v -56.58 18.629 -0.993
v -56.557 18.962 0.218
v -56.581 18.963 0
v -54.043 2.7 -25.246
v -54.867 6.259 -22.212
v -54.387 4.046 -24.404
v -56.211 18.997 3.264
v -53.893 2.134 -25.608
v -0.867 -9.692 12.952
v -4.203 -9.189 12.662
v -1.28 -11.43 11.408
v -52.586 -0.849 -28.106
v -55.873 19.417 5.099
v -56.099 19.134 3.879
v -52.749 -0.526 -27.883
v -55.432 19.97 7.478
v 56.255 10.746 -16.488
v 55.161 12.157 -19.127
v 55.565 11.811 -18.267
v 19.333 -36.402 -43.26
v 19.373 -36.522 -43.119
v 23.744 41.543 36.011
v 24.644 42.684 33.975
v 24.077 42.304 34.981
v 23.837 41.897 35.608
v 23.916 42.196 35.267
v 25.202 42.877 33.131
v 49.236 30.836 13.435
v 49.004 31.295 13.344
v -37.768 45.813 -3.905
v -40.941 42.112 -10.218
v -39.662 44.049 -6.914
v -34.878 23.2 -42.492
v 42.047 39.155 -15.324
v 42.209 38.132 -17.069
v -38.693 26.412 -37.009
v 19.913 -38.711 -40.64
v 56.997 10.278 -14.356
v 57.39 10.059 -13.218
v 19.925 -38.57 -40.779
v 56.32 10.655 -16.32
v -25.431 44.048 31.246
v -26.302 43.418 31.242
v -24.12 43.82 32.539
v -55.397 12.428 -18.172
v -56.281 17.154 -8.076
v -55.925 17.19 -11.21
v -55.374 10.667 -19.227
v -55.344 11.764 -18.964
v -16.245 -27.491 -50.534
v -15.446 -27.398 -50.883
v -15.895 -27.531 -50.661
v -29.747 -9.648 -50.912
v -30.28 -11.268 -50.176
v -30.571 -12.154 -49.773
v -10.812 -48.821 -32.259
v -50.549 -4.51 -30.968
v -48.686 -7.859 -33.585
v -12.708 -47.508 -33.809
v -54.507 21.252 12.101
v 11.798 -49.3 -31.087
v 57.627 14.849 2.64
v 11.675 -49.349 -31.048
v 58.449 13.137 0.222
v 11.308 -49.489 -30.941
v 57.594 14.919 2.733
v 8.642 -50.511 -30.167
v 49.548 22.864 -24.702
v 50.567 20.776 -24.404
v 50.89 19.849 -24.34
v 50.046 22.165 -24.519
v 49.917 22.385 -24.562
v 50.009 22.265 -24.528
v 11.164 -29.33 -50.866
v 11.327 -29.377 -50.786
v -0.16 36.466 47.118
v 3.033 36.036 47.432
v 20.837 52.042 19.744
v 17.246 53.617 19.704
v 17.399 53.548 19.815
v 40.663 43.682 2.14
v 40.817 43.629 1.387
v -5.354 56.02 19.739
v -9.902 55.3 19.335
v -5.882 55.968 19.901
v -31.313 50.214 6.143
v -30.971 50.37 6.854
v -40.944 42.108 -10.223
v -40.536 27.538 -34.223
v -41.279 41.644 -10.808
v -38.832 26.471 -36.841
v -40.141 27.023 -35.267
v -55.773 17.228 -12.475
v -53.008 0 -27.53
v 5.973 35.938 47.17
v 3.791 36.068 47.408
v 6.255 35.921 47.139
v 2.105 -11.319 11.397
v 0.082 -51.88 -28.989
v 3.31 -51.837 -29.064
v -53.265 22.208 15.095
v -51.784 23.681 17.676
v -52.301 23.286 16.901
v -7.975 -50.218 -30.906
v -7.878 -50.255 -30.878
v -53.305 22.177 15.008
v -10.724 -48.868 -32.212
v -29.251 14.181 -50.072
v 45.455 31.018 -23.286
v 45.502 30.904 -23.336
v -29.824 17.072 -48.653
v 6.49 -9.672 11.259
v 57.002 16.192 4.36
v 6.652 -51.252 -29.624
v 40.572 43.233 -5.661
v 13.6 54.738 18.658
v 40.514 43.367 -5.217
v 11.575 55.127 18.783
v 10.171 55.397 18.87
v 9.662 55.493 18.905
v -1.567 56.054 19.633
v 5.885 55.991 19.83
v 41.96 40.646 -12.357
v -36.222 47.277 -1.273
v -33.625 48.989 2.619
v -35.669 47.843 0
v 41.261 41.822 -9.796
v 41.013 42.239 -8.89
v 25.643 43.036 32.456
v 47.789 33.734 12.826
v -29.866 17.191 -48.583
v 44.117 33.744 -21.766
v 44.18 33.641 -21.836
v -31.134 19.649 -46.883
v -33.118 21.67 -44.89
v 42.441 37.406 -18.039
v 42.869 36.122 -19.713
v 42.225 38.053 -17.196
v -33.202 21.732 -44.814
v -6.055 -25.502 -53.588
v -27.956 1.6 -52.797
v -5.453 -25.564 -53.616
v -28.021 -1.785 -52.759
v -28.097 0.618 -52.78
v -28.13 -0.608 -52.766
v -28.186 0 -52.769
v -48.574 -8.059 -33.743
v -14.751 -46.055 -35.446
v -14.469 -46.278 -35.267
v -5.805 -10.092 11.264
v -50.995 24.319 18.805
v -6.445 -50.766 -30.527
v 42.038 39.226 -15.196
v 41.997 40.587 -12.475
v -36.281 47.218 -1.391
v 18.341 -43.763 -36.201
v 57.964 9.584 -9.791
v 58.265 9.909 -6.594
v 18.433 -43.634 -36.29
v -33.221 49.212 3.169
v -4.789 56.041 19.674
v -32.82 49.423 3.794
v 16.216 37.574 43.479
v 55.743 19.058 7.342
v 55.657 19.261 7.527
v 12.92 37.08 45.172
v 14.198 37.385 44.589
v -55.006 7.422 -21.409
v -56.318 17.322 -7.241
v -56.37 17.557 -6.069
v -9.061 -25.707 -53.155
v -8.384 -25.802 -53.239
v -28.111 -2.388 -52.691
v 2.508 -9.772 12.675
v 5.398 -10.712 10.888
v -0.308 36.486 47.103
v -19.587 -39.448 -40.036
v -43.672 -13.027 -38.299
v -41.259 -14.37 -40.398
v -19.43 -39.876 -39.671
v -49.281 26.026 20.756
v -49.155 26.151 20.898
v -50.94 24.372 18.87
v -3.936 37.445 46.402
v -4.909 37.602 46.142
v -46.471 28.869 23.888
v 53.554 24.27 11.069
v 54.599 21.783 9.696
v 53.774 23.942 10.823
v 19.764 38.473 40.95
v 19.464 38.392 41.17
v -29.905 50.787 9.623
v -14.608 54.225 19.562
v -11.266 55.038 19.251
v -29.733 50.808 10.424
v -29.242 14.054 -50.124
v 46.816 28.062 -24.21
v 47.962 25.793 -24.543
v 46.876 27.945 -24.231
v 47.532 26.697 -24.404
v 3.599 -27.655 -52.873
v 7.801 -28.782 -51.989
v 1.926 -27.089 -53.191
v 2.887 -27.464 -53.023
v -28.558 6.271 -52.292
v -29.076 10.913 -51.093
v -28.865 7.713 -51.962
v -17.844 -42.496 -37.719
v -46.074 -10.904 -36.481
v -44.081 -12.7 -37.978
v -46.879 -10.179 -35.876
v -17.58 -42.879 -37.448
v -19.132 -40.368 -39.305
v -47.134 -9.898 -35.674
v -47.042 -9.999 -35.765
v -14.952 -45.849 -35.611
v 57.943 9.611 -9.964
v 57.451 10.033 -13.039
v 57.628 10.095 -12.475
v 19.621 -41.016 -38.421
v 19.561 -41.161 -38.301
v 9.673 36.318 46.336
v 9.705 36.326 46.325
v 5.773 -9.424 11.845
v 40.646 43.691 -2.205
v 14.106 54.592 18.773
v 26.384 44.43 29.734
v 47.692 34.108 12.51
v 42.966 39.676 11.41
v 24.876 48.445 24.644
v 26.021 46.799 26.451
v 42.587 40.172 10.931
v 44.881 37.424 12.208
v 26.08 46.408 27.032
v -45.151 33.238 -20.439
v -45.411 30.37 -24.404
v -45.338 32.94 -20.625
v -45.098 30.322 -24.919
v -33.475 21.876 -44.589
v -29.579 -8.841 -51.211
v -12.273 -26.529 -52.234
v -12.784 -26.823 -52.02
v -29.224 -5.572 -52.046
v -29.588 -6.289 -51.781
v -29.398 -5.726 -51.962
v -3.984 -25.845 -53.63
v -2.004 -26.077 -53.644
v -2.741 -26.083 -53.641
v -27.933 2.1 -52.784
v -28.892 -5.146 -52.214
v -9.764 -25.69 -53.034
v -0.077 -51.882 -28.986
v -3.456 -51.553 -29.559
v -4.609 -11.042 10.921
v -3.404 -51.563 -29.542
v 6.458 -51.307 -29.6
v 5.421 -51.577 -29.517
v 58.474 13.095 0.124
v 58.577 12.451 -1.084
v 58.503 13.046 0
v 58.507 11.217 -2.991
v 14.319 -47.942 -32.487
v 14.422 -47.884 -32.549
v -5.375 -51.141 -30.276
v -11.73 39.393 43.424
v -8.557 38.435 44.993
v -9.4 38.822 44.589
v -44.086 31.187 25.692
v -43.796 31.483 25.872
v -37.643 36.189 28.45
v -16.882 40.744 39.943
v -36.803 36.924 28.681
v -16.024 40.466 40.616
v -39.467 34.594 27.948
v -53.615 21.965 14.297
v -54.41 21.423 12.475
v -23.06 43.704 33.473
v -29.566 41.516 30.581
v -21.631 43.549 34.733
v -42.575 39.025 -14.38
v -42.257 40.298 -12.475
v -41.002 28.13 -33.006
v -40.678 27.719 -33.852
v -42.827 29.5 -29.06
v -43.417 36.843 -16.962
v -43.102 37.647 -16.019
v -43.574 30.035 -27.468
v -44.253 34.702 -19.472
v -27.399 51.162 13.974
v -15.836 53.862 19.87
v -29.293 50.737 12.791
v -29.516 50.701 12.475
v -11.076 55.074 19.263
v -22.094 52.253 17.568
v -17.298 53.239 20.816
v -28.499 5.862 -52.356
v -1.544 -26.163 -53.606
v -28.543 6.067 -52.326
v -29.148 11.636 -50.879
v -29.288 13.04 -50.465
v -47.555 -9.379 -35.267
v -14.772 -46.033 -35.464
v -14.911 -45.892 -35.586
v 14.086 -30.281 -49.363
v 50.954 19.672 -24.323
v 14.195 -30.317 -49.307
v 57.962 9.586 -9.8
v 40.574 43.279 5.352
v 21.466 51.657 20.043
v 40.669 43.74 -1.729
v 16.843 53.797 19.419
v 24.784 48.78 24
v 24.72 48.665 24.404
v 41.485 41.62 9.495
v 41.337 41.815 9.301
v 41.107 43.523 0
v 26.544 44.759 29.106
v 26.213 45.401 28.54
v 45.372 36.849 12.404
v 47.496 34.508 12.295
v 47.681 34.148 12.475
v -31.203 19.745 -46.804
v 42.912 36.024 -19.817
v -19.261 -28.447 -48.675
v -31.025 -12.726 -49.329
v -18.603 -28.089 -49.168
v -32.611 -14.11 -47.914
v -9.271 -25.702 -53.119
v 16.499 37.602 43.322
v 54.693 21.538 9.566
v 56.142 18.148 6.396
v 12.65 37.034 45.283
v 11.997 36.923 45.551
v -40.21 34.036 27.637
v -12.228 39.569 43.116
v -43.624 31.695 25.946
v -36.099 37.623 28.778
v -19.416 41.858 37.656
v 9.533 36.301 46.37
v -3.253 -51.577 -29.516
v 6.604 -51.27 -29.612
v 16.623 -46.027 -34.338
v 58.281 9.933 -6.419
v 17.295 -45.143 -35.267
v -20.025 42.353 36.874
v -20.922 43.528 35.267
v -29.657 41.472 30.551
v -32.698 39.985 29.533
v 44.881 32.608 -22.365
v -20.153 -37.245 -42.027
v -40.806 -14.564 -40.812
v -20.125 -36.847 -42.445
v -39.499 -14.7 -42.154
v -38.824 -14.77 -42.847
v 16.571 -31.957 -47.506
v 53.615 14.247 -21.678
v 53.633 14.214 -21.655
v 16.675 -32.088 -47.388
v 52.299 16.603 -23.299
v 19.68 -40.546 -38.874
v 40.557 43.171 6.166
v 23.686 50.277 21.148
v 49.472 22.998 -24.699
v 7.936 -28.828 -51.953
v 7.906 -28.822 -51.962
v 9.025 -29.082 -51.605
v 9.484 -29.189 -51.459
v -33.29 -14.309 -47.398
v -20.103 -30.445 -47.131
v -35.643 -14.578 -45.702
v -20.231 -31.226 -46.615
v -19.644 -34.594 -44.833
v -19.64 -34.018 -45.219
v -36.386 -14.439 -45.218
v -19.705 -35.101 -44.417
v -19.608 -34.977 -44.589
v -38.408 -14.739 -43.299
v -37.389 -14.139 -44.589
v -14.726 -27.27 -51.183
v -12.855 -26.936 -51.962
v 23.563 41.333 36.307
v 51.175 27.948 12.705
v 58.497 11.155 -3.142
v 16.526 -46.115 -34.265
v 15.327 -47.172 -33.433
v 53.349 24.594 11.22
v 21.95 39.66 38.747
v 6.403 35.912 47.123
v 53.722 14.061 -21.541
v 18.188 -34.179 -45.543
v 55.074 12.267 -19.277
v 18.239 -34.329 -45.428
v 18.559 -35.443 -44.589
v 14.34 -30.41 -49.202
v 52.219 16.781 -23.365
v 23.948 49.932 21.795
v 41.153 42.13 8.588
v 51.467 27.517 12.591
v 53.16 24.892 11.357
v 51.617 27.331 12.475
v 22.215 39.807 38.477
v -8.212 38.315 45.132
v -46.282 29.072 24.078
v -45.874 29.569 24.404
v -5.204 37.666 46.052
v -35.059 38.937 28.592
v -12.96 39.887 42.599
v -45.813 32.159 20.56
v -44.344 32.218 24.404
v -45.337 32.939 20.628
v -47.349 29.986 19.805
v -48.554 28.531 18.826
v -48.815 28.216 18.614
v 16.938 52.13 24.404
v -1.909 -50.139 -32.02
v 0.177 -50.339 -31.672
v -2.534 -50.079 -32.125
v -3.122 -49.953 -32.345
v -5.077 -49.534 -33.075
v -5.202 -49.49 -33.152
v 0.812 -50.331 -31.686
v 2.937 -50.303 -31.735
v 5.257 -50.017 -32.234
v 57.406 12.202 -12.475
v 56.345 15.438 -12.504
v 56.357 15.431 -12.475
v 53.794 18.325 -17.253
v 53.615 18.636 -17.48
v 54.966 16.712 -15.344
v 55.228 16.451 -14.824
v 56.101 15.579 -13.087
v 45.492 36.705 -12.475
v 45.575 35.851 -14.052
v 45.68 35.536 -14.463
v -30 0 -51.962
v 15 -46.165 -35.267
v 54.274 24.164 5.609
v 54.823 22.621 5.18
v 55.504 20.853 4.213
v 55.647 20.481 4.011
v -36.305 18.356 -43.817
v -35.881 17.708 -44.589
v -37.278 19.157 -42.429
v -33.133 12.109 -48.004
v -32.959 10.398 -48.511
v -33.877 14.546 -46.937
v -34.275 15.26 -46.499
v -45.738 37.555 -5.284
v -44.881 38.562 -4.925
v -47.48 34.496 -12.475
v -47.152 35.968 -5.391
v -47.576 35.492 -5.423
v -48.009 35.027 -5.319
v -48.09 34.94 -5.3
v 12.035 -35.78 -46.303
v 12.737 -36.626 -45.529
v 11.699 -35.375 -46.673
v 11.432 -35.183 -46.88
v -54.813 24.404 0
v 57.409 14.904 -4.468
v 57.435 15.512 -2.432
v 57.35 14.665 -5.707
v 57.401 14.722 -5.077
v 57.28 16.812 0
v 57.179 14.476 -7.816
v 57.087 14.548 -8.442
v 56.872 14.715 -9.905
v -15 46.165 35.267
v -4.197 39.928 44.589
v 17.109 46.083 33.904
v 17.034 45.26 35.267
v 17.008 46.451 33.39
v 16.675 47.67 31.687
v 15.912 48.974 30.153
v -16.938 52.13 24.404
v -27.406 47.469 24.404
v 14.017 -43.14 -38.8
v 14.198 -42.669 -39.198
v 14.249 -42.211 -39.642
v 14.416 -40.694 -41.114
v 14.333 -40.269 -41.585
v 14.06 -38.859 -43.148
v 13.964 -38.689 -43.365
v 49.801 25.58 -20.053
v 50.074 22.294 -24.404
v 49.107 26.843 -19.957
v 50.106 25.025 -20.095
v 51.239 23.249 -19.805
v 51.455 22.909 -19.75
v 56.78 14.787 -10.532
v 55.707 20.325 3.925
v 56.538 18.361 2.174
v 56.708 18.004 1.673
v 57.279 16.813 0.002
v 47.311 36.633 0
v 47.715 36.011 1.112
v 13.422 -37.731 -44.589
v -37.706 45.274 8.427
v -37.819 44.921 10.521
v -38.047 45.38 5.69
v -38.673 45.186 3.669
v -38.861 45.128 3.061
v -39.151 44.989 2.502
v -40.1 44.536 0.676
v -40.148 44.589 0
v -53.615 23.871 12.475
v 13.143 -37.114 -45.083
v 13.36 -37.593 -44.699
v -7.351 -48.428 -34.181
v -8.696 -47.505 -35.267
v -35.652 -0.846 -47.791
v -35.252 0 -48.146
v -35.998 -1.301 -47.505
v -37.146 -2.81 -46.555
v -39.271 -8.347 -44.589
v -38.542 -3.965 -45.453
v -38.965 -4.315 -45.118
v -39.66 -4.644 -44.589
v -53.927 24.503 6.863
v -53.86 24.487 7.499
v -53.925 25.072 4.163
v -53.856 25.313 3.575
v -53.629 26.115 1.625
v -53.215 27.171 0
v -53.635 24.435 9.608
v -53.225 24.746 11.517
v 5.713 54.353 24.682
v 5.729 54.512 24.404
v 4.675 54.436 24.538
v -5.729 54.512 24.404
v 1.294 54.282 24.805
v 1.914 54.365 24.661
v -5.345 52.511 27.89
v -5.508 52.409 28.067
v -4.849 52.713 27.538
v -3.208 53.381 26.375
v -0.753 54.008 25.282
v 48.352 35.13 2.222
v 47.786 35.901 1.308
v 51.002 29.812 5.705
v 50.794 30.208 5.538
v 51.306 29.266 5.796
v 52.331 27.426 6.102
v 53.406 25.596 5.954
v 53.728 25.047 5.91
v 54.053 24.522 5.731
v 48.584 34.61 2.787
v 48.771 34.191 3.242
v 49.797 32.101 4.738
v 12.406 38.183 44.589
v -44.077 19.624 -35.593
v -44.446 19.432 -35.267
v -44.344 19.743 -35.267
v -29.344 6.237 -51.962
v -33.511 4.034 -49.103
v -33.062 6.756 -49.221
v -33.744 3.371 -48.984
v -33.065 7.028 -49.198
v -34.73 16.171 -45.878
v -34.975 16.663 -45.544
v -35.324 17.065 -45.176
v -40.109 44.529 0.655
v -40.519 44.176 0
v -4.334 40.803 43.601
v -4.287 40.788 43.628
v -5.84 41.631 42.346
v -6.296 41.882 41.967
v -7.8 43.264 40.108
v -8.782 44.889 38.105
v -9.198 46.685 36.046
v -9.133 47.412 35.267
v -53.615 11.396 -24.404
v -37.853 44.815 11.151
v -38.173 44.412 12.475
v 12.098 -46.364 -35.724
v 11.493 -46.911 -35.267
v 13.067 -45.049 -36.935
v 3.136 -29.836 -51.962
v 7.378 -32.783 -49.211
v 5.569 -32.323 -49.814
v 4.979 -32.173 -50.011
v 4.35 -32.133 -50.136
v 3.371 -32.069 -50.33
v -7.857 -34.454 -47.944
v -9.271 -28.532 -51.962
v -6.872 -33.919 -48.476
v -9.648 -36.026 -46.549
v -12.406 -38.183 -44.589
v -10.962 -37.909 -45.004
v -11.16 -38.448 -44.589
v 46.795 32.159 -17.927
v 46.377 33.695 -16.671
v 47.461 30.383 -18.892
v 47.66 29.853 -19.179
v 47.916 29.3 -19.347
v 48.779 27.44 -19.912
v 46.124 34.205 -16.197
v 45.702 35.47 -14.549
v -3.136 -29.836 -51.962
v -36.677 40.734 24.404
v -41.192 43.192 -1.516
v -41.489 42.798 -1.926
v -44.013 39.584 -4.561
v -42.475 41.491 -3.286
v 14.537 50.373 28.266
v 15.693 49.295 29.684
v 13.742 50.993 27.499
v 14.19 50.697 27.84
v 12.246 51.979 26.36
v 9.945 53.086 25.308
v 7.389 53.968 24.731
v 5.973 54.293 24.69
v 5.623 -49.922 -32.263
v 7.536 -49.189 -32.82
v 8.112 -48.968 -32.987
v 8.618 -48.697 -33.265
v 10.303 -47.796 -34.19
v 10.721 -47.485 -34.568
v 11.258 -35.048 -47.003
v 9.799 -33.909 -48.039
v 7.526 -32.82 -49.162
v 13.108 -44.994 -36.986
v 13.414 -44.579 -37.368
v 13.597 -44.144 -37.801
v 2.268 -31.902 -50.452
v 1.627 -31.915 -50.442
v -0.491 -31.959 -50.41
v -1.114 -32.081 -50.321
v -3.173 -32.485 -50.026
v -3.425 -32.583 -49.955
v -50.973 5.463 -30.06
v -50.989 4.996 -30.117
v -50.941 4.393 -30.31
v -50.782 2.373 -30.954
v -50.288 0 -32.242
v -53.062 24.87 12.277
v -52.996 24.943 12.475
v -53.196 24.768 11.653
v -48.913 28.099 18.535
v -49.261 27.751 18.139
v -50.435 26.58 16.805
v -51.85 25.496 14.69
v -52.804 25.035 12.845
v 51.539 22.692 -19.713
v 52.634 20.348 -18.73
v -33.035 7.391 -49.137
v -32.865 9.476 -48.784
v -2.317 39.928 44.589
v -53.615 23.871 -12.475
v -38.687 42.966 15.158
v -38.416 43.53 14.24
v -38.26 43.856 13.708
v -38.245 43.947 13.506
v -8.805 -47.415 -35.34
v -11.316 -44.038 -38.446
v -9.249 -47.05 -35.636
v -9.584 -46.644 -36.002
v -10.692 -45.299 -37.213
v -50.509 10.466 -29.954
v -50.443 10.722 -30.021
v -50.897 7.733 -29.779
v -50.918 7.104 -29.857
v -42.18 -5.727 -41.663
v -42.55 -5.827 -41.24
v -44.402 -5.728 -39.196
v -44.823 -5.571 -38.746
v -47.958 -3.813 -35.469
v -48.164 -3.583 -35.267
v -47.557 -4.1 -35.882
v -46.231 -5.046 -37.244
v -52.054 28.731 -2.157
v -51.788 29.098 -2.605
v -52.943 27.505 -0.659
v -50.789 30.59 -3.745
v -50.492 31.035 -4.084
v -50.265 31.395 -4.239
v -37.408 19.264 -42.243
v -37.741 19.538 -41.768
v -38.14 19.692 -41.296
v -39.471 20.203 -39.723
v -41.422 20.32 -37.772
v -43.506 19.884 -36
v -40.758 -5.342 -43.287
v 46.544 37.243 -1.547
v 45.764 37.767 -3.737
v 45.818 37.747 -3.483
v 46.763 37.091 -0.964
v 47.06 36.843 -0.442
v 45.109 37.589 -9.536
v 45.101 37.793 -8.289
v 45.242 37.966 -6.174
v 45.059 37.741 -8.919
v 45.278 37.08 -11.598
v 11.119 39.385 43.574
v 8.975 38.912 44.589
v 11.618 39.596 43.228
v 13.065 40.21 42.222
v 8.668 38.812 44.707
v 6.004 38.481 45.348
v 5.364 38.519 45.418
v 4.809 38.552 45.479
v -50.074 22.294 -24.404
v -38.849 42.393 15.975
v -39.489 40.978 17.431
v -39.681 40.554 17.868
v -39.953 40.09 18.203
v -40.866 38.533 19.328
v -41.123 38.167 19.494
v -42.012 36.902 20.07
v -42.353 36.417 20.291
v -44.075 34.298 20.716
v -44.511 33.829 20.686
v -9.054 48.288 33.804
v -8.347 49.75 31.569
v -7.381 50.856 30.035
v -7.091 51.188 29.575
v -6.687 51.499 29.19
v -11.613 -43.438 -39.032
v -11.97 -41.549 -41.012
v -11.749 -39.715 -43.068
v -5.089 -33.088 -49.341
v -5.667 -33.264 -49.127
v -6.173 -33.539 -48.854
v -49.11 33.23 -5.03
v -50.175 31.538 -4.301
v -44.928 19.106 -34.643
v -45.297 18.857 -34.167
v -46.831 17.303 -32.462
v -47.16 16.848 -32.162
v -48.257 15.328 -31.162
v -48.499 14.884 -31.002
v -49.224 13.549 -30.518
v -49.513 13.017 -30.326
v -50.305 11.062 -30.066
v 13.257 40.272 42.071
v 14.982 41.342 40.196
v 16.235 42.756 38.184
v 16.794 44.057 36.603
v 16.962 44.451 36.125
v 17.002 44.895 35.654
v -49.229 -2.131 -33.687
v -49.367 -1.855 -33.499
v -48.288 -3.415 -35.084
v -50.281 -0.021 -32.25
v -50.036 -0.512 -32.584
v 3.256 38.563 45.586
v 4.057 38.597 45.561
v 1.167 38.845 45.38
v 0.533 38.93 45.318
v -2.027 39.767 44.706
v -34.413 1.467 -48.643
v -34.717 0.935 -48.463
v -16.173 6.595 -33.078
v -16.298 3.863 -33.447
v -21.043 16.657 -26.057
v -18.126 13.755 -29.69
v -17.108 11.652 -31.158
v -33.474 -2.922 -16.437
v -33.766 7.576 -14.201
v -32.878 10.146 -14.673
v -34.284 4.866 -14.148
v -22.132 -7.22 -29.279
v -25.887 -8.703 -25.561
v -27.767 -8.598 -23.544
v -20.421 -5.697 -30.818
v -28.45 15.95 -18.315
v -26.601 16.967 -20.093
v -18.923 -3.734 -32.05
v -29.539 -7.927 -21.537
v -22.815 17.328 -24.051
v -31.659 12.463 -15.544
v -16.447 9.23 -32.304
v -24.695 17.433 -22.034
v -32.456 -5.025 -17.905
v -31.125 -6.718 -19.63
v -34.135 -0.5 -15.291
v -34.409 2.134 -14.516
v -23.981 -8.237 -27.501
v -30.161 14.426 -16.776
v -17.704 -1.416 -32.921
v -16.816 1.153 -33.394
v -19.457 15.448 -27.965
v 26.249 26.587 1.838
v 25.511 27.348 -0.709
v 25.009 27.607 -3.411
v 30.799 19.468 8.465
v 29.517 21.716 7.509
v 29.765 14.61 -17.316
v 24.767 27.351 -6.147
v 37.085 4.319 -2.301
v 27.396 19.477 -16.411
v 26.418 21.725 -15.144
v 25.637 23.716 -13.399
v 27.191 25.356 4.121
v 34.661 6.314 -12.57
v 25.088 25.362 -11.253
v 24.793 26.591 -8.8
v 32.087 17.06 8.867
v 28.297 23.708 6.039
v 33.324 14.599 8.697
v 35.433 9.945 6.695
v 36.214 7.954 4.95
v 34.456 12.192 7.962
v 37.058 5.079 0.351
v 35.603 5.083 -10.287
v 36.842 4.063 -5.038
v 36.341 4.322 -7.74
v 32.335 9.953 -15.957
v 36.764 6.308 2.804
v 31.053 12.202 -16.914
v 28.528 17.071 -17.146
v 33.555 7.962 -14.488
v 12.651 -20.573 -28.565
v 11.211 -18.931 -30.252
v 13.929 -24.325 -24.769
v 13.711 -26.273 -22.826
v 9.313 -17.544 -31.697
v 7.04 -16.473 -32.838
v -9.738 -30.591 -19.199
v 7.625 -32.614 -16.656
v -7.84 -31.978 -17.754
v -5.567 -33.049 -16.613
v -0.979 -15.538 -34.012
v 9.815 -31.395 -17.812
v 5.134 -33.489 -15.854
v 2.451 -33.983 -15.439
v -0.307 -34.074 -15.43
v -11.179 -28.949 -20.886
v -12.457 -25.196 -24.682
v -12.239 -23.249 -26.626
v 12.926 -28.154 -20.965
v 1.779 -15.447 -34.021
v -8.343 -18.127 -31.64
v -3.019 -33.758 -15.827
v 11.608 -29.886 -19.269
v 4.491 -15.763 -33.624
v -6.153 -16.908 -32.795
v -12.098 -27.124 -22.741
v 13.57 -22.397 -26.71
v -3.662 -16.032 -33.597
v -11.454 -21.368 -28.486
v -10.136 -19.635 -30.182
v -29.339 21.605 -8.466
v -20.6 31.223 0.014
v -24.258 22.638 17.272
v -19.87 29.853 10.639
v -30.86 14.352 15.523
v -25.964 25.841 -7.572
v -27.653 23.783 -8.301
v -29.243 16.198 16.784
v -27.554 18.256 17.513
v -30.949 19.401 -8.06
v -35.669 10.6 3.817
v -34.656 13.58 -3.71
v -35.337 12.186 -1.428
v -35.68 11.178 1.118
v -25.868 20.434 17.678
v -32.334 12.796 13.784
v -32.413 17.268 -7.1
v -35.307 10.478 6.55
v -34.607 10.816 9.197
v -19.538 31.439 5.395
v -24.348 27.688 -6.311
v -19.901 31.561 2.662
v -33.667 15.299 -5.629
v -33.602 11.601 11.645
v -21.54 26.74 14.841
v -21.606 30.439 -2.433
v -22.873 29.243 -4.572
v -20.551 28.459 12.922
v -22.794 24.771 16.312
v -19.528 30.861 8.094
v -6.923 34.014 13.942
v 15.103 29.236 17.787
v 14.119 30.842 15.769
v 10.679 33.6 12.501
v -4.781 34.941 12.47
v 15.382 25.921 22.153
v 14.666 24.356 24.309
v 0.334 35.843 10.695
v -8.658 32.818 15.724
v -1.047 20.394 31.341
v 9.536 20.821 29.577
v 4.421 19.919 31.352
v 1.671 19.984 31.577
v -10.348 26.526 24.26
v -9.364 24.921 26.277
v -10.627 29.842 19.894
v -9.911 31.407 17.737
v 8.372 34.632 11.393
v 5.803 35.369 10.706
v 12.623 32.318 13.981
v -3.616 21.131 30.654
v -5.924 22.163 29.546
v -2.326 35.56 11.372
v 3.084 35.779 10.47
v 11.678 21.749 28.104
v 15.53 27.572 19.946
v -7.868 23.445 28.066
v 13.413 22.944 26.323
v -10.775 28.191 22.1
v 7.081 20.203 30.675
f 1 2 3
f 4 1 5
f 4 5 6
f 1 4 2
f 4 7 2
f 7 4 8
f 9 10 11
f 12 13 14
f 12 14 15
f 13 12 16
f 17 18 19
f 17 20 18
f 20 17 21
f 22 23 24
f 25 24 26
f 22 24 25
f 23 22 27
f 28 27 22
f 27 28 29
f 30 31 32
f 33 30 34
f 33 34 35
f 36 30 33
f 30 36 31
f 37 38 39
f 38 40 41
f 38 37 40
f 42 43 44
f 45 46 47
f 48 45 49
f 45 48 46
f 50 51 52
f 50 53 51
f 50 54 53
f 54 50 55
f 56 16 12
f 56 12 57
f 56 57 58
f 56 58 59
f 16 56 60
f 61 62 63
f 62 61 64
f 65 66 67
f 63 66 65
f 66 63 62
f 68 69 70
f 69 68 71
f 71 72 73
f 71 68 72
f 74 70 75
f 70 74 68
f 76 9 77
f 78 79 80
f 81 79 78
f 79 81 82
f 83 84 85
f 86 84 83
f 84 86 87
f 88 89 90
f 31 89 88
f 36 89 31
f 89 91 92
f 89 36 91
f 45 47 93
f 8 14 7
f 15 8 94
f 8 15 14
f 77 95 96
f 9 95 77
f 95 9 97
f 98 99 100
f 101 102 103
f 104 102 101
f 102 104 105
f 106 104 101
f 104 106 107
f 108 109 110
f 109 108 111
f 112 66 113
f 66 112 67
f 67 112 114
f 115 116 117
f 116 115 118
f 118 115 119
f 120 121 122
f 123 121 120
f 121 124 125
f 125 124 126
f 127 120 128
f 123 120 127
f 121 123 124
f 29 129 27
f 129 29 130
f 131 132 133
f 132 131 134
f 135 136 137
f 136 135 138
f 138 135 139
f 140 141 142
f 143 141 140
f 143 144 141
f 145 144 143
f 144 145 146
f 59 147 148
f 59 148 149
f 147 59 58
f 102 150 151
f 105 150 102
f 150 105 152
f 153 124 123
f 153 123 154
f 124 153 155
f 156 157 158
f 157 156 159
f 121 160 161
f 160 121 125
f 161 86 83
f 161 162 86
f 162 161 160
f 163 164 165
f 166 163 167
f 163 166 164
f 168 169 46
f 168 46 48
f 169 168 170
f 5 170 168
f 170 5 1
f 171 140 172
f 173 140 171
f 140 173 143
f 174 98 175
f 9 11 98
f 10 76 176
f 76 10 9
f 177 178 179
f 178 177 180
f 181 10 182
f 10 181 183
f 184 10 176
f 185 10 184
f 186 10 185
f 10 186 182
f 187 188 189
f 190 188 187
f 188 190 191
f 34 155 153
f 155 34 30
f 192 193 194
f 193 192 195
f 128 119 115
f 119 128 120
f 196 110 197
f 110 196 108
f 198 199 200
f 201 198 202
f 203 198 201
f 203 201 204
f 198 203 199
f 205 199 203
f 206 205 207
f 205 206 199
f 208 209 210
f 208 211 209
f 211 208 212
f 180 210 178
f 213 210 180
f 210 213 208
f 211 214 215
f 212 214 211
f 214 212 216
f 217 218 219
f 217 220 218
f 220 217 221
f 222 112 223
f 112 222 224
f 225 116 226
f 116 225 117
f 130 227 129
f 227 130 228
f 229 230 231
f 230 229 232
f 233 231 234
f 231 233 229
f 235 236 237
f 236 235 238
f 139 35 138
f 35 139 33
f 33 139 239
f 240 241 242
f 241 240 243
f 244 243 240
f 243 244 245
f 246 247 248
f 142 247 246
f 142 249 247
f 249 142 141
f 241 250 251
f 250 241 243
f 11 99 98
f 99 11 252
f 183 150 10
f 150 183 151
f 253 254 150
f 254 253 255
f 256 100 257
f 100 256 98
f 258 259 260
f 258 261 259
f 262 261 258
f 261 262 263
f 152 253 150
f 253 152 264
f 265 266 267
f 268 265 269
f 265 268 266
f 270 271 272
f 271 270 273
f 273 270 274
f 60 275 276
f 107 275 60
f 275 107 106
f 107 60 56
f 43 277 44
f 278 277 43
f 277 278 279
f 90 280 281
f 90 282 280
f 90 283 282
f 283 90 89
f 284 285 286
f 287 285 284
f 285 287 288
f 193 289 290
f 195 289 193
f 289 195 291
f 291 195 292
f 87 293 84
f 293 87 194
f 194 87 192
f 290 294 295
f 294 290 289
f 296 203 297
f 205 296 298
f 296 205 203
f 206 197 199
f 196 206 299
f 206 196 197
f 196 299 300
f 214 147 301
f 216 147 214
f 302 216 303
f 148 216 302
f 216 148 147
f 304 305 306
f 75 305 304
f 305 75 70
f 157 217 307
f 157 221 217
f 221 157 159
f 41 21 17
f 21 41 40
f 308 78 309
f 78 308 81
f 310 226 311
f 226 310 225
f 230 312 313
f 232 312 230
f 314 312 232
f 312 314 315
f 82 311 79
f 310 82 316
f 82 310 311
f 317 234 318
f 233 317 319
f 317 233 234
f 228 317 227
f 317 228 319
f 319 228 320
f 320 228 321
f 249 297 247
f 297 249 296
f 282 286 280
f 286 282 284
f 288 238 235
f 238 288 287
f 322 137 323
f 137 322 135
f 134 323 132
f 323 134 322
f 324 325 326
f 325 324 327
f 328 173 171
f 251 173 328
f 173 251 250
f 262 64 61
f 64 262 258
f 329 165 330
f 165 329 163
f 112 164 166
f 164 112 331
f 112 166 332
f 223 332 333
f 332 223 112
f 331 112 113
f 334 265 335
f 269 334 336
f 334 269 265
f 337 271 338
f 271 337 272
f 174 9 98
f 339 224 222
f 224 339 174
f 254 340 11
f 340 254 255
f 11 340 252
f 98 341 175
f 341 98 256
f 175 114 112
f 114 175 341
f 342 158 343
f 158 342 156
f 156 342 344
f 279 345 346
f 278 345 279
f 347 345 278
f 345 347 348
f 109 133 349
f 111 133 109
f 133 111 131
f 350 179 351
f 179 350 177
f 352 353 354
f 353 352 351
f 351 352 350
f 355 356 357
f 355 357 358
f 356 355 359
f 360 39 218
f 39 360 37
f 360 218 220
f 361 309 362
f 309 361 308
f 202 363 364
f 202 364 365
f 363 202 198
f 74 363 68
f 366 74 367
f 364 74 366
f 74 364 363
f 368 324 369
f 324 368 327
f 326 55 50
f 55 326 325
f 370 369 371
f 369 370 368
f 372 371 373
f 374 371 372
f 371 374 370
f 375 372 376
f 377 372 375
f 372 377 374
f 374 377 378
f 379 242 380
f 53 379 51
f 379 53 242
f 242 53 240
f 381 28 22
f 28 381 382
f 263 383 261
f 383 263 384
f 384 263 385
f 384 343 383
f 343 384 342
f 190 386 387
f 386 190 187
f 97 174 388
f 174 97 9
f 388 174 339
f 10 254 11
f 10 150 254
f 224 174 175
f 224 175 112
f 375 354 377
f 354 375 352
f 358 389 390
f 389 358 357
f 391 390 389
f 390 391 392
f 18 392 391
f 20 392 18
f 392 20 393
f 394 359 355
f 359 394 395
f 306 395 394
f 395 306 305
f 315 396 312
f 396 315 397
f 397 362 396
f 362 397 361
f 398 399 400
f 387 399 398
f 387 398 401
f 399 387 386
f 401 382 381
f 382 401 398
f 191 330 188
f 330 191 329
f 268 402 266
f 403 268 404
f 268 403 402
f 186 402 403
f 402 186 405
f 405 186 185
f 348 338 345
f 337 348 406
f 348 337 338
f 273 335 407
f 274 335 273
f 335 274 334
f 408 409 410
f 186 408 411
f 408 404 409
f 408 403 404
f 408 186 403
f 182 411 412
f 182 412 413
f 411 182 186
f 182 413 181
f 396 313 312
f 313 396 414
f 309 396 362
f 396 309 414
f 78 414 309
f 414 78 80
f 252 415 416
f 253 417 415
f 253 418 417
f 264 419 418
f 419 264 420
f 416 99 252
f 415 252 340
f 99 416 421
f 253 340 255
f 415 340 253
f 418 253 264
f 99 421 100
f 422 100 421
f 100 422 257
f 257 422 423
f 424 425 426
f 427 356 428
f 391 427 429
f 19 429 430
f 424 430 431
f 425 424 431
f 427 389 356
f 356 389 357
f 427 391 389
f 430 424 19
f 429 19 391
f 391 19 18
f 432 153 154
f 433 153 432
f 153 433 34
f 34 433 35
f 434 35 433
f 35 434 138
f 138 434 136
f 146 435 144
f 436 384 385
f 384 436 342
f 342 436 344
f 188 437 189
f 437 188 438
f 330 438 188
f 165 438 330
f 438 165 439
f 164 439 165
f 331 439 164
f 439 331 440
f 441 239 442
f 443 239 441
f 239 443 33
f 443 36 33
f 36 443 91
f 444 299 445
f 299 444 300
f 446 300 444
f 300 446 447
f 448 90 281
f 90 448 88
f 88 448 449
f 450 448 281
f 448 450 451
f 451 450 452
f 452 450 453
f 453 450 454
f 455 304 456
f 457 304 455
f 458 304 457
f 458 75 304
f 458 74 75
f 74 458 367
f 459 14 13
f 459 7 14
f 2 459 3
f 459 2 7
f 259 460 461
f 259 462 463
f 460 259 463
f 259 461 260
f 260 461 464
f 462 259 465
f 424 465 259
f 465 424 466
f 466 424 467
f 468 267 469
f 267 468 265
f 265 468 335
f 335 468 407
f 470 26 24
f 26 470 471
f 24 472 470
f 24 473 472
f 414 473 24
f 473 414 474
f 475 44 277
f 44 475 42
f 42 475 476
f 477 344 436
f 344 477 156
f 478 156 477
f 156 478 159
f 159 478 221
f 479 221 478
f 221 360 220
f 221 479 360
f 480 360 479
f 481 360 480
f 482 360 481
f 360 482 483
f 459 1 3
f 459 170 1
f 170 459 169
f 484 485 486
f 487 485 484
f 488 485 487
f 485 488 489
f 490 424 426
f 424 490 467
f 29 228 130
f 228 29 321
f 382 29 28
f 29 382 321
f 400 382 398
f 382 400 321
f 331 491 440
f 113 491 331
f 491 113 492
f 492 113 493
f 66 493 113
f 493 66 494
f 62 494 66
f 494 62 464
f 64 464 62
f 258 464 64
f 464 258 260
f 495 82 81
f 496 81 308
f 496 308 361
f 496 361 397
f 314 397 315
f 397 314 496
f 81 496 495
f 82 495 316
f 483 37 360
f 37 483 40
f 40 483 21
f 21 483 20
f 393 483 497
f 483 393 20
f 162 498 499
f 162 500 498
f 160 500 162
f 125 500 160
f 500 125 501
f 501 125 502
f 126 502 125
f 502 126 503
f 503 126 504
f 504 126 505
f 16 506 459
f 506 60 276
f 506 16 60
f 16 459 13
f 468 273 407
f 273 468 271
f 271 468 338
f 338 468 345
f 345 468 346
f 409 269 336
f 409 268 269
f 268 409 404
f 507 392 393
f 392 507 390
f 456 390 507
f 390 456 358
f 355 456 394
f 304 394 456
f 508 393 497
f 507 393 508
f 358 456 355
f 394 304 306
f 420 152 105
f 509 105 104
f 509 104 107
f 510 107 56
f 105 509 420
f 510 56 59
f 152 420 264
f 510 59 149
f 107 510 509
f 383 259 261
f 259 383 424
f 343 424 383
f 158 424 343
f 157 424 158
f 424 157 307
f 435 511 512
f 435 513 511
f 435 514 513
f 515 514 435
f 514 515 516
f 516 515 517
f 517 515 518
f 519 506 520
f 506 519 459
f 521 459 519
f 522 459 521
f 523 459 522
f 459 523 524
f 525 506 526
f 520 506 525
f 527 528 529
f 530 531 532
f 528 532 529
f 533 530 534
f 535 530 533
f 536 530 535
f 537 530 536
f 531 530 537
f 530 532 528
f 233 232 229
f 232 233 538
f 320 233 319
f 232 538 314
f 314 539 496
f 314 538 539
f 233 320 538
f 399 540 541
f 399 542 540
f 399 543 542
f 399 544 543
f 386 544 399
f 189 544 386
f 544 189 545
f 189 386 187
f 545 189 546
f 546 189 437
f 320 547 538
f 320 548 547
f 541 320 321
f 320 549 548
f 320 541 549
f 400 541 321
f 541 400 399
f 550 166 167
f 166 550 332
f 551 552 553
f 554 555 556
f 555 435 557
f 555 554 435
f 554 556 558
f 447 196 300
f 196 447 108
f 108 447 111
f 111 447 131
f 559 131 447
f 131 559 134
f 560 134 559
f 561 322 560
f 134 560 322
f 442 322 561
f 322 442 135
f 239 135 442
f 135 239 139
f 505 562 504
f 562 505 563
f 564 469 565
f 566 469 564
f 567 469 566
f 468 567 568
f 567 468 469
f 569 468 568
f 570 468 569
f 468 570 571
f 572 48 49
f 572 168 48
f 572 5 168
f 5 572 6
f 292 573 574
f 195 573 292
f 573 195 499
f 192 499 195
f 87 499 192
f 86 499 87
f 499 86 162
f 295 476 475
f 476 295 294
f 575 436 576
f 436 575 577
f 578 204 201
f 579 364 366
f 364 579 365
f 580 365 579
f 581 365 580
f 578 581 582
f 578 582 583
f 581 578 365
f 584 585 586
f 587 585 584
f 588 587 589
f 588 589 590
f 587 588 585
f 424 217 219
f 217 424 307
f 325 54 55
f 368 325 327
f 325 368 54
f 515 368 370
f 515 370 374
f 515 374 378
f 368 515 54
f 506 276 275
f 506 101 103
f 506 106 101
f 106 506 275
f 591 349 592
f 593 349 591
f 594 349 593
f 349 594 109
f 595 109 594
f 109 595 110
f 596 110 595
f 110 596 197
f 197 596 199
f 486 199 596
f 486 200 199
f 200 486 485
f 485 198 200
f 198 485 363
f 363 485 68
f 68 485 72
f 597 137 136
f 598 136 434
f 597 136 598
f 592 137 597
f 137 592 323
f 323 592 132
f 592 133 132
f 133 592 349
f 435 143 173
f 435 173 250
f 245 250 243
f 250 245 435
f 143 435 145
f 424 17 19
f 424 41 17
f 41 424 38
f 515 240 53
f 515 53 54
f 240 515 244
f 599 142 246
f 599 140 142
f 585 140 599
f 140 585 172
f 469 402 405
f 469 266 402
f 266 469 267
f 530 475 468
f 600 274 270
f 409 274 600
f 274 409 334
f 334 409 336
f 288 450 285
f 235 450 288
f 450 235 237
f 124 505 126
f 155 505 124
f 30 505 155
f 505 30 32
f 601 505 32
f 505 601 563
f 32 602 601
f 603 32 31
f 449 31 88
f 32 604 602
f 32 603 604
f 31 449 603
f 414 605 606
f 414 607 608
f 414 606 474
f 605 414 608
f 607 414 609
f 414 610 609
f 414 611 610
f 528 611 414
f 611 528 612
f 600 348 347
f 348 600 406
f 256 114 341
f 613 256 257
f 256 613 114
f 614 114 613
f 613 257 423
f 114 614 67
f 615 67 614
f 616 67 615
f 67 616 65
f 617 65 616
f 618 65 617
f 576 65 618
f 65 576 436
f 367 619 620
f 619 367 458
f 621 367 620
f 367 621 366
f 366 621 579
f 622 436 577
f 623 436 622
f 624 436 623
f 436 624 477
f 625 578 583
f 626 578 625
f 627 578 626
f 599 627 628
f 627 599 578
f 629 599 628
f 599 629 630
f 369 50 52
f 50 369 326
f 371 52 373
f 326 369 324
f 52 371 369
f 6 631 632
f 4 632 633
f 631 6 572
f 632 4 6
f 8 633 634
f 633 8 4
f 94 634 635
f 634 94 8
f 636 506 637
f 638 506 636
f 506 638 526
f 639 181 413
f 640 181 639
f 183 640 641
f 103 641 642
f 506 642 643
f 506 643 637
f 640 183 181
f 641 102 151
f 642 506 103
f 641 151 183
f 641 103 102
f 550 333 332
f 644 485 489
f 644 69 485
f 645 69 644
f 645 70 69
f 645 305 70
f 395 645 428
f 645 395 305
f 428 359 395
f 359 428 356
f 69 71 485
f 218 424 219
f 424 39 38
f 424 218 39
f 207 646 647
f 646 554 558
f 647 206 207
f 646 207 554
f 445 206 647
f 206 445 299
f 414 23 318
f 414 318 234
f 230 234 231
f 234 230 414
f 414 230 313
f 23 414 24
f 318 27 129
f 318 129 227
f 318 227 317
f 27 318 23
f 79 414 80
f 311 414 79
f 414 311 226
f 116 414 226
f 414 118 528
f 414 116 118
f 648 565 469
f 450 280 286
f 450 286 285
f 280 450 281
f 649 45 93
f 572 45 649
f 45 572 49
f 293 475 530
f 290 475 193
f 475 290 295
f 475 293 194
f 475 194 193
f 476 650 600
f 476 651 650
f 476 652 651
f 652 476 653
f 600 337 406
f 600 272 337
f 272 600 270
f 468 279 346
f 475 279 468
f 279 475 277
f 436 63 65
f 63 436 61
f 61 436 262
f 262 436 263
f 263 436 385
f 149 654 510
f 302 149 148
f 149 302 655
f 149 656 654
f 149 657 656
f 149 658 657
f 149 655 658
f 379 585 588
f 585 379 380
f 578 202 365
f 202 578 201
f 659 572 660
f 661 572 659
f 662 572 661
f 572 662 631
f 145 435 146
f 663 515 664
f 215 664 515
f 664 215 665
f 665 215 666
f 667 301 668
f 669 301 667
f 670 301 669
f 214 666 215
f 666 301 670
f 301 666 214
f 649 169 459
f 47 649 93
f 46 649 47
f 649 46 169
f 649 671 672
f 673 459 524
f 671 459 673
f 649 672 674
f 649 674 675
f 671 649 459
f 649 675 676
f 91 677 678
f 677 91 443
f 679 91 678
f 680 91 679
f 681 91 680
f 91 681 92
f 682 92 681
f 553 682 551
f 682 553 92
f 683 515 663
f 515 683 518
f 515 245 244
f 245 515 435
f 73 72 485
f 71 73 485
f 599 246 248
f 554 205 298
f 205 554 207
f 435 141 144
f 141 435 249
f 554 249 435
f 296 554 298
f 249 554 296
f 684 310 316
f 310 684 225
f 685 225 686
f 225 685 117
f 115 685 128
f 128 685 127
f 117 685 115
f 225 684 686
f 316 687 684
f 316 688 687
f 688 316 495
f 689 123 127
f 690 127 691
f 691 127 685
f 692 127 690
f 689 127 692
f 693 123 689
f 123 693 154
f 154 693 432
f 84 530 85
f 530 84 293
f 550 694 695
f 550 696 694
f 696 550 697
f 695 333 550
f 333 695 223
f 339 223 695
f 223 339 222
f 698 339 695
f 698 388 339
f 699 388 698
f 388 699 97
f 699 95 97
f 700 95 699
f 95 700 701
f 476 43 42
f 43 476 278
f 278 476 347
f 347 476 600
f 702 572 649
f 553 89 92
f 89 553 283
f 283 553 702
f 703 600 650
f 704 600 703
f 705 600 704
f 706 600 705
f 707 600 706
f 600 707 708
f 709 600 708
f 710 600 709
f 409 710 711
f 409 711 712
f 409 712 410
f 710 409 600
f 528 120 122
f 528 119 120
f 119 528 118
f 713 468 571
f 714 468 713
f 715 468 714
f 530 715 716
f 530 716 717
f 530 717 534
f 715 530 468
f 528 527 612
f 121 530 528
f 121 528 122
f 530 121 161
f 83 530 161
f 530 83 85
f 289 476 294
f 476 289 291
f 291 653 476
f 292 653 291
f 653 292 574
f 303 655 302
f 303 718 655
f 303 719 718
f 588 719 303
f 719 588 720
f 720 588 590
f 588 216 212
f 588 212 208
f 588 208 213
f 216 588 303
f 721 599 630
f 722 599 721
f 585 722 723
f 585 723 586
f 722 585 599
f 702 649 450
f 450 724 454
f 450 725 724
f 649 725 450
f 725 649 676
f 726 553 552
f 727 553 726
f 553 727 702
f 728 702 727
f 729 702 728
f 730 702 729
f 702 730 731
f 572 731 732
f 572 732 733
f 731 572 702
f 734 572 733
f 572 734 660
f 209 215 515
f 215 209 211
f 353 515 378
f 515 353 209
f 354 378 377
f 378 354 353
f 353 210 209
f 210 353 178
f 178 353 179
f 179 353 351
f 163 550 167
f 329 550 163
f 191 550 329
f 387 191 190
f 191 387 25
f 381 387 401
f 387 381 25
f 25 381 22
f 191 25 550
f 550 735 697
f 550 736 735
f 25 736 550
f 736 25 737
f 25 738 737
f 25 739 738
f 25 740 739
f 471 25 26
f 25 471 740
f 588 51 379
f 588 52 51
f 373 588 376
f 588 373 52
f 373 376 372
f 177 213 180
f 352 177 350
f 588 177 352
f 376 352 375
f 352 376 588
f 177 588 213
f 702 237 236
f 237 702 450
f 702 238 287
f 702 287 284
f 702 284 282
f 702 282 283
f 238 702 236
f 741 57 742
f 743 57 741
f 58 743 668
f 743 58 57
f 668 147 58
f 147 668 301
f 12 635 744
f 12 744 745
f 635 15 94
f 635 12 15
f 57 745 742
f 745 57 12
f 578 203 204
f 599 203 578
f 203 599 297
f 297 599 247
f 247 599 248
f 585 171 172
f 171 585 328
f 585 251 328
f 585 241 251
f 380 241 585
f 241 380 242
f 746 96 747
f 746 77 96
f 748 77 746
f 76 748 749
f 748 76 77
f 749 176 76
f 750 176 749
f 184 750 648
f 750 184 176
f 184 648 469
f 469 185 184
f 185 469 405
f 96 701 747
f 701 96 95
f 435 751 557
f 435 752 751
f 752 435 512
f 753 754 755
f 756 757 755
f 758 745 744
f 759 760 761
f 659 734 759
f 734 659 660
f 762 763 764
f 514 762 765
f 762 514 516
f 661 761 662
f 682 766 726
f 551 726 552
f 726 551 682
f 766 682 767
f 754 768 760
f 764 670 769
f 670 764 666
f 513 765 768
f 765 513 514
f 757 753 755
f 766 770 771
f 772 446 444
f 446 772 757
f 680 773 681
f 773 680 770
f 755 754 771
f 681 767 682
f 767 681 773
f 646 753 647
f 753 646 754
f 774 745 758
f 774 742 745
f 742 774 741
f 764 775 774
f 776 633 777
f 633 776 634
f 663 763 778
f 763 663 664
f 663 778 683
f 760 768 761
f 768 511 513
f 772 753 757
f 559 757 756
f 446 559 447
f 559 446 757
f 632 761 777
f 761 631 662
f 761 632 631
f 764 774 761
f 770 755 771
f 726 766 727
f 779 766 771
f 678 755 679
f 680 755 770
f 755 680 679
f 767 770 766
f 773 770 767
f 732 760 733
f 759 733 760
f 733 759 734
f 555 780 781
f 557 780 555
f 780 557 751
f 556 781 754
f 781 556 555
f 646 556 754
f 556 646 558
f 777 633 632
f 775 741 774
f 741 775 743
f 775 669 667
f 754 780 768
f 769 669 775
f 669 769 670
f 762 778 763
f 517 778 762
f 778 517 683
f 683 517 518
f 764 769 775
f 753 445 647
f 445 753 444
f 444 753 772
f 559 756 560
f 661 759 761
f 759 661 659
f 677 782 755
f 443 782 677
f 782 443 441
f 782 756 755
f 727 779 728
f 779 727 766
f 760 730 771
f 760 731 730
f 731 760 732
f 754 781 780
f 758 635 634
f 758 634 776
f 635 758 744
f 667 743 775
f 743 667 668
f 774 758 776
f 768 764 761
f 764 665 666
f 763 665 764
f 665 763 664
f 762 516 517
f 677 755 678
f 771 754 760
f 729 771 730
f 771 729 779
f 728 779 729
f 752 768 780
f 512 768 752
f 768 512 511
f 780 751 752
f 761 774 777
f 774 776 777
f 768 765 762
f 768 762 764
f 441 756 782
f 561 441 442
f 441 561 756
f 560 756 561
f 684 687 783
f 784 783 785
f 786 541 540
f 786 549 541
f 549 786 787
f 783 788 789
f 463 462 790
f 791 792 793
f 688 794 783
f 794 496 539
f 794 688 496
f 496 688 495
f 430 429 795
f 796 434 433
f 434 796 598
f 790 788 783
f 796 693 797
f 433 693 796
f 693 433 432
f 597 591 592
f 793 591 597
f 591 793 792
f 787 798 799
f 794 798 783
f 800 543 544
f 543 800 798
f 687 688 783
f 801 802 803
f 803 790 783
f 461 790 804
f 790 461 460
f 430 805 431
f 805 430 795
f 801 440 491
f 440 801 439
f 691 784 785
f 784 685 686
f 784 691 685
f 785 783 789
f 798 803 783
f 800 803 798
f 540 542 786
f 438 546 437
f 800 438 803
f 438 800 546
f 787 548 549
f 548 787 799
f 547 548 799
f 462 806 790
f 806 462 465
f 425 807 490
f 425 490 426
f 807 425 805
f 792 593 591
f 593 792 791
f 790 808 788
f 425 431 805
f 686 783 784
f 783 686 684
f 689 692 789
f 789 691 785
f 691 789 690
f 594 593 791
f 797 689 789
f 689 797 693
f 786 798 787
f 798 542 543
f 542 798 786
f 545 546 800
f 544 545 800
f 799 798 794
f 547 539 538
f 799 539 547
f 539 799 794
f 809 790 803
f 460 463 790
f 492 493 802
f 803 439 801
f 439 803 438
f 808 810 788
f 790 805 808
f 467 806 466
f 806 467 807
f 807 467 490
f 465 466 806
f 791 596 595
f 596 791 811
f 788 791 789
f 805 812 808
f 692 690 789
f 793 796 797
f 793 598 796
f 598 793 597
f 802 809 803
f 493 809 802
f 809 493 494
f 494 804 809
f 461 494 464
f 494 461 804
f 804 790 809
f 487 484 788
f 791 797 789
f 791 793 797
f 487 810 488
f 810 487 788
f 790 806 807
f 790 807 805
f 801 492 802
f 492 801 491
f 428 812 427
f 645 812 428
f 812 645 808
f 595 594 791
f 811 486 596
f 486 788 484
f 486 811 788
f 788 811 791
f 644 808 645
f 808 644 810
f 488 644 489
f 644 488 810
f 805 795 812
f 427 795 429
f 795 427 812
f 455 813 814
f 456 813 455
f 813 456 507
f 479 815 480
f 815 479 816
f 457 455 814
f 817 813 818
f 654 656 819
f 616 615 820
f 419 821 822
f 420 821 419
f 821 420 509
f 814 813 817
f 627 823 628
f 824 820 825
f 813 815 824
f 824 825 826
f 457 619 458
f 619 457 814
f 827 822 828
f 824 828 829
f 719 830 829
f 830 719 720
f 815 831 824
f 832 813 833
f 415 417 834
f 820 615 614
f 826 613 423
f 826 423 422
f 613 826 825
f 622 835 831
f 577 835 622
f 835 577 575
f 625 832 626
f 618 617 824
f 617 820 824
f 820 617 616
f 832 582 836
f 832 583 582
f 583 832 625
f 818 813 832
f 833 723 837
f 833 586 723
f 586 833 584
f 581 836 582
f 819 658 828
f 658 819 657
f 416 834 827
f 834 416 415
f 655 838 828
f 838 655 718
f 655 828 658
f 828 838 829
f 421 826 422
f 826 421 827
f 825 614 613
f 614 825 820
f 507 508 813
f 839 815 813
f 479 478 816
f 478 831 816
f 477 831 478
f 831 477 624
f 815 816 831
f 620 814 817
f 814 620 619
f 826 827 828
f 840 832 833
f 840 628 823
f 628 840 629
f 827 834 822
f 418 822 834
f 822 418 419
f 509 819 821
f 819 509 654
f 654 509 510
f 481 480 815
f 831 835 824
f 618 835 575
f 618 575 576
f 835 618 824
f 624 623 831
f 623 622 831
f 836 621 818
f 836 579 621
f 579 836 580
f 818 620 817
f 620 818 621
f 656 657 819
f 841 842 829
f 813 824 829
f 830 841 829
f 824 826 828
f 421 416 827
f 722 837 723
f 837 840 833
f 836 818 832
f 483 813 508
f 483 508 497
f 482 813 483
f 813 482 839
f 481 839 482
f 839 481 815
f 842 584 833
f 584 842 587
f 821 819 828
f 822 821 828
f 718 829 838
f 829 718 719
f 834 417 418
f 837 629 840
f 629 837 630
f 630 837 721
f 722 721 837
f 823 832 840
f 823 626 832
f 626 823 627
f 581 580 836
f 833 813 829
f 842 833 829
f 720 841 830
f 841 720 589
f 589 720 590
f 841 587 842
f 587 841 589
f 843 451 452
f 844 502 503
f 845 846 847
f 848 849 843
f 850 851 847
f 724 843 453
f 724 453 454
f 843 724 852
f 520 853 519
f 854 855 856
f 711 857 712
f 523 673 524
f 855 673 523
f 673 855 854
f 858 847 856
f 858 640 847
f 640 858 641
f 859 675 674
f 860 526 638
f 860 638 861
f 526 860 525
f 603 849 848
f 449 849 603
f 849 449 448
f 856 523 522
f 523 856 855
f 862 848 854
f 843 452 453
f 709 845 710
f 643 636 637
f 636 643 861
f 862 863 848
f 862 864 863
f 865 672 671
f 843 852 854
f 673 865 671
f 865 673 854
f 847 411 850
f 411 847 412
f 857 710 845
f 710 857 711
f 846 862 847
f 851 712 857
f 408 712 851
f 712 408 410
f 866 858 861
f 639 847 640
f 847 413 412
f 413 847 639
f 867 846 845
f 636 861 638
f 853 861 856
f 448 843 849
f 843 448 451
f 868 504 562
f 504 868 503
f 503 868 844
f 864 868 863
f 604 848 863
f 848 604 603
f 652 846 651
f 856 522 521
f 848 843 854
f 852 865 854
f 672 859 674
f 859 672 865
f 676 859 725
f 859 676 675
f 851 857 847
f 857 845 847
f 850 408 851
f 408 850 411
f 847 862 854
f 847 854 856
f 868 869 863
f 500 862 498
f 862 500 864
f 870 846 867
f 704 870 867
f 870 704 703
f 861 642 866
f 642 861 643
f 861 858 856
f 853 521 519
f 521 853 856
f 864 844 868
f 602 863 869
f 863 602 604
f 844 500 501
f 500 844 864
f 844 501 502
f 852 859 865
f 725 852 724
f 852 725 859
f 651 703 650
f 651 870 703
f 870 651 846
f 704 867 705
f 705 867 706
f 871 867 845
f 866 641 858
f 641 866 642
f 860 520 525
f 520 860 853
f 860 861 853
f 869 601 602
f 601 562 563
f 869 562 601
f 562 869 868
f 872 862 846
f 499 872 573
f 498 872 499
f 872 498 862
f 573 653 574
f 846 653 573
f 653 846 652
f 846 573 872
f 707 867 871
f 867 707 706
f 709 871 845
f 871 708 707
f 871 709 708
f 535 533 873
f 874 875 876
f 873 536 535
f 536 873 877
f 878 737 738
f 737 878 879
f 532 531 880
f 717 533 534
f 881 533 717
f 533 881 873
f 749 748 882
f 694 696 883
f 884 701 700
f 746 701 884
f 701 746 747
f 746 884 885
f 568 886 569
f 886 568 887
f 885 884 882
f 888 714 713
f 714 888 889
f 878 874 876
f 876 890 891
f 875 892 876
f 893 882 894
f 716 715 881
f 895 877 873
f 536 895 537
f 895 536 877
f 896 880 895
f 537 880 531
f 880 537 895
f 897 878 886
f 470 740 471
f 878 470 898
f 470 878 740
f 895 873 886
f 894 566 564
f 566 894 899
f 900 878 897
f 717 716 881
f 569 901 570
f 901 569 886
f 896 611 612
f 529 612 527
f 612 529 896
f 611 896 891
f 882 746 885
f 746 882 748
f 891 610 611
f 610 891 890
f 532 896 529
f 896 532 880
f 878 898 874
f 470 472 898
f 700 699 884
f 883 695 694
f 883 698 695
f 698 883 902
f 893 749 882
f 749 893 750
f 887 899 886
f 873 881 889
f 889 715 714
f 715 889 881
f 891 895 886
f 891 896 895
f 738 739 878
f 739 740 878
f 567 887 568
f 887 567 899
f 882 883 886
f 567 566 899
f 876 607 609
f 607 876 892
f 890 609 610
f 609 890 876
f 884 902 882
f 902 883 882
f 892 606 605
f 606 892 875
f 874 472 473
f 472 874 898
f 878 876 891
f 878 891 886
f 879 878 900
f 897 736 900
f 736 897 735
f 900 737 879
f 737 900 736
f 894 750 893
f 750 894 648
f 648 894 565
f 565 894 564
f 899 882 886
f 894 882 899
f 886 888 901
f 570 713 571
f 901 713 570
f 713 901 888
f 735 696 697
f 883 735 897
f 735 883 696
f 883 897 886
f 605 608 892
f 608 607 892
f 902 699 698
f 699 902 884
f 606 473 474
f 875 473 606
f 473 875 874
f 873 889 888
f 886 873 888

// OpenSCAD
difference() {
	intersection() {
		hull() {
			rotate(a = -120.3141209556, v = [-0.7944260306, -0.3378230484, 0.0000000000]) {
				rotate(a = -90.0000000000, v = [-0.9659258263, 0.2588190451, 0.0000000000]) {
					cylinder(h = 60, r = 16.2000000000);
				}
			}
			rotate(a = -120.3141209556, v = [-0.7944260306, -0.3378230484, 0.0000000000]) {
				rotate(a = -90.0000000000, v = [0.2588190451, -0.9659258263, 0.0000000000]) {
					cylinder(h = 60, r = 16.2000000000);
				}
			}
			rotate(a = -120.3141209556, v = [-0.7944260306, -0.3378230484, 0.0000000000]) {
				rotate(a = -22.2263282801, v = [-0.3557637402, 0.1285203412, 0.0000000000]) {
					cylinder(h = 60, r = 16.2000000000);
				}
			}
			rotate(a = -120.3141209556, v = [-0.7944260306, -0.3378230484, 0.0000000000]) {
				rotate(a = -144.0917087294, v = [-0.4875669891, 0.3259577409, 0.0000000000]) {
					cylinder(h = 60, r = 16.2000000000);
				}
			}
			rotate(a = -120.3141209556, v = [-0.7944260306, -0.3378230484, 0.0000000000]) {
				rotate(a = -155.9342565737, v = [0.2954832486, -0.2810301414, 0.0000000000]) {
					cylinder(h = 60, r = 16.2000000000);
				}
			}
		}
		sphere(r = 60);
	}
	union() {
		rotate(a = -120.3141209556, v = [-0.7944260306, -0.3378230484, 0.0000000000]) {
			rotate(a = -90.0000000000, v = [-0.9659258263, 0.2588190451, 0.0000000000]) {
				translate(v = [0, 0, 35]) {
					cylinder(h = 100, r = 13.2000000000);
				}
			}
		}
		rotate(a = -120.3141209556, v = [-0.7944260306, -0.3378230484, 0.0000000000]) {
			rotate(a = -90.0000000000, v = [0.2588190451, -0.9659258263, 0.0000000000]) {
				translate(v = [0, 0, 35]) {
					cylinder(h = 100, r = 13.2000000000);
				}
			}
		}
		rotate(a = -120.3141209556, v = [-0.7944260306, -0.3378230484, 0.0000000000]) {
			rotate(a = -22.2263282801, v = [-0.3557637402, 0.1285203412, 0.0000000000]) {
				translate(v = [0, 0, 35]) {
					cylinder(h = 100, r = 13.2000000000);
				}
			}
		}
		rotate(a = -120.3141209556, v = [-0.7944260306, -0.3378230484, 0.0000000000]) {
			rotate(a = -144.0917087294, v = [-0.4875669891, 0.3259577409, 0.0000000000]) {
				translate(v = [0, 0, 35]) {
					cylinder(h = 100, r = 13.2000000000);
				}
			}
		}
		rotate(a = -120.3141209556, v = [-0.7944260306, -0.3378230484, 0.0000000000]) {
			rotate(a = -155.9342565737, v = [0.2954832486, -0.2810301414, 0.0000000000]) {
				translate(v = [0, 0, 35]) {
					cylinder(h = 100, r = 13.2000000000);
				}
			}
		}
	}
}
